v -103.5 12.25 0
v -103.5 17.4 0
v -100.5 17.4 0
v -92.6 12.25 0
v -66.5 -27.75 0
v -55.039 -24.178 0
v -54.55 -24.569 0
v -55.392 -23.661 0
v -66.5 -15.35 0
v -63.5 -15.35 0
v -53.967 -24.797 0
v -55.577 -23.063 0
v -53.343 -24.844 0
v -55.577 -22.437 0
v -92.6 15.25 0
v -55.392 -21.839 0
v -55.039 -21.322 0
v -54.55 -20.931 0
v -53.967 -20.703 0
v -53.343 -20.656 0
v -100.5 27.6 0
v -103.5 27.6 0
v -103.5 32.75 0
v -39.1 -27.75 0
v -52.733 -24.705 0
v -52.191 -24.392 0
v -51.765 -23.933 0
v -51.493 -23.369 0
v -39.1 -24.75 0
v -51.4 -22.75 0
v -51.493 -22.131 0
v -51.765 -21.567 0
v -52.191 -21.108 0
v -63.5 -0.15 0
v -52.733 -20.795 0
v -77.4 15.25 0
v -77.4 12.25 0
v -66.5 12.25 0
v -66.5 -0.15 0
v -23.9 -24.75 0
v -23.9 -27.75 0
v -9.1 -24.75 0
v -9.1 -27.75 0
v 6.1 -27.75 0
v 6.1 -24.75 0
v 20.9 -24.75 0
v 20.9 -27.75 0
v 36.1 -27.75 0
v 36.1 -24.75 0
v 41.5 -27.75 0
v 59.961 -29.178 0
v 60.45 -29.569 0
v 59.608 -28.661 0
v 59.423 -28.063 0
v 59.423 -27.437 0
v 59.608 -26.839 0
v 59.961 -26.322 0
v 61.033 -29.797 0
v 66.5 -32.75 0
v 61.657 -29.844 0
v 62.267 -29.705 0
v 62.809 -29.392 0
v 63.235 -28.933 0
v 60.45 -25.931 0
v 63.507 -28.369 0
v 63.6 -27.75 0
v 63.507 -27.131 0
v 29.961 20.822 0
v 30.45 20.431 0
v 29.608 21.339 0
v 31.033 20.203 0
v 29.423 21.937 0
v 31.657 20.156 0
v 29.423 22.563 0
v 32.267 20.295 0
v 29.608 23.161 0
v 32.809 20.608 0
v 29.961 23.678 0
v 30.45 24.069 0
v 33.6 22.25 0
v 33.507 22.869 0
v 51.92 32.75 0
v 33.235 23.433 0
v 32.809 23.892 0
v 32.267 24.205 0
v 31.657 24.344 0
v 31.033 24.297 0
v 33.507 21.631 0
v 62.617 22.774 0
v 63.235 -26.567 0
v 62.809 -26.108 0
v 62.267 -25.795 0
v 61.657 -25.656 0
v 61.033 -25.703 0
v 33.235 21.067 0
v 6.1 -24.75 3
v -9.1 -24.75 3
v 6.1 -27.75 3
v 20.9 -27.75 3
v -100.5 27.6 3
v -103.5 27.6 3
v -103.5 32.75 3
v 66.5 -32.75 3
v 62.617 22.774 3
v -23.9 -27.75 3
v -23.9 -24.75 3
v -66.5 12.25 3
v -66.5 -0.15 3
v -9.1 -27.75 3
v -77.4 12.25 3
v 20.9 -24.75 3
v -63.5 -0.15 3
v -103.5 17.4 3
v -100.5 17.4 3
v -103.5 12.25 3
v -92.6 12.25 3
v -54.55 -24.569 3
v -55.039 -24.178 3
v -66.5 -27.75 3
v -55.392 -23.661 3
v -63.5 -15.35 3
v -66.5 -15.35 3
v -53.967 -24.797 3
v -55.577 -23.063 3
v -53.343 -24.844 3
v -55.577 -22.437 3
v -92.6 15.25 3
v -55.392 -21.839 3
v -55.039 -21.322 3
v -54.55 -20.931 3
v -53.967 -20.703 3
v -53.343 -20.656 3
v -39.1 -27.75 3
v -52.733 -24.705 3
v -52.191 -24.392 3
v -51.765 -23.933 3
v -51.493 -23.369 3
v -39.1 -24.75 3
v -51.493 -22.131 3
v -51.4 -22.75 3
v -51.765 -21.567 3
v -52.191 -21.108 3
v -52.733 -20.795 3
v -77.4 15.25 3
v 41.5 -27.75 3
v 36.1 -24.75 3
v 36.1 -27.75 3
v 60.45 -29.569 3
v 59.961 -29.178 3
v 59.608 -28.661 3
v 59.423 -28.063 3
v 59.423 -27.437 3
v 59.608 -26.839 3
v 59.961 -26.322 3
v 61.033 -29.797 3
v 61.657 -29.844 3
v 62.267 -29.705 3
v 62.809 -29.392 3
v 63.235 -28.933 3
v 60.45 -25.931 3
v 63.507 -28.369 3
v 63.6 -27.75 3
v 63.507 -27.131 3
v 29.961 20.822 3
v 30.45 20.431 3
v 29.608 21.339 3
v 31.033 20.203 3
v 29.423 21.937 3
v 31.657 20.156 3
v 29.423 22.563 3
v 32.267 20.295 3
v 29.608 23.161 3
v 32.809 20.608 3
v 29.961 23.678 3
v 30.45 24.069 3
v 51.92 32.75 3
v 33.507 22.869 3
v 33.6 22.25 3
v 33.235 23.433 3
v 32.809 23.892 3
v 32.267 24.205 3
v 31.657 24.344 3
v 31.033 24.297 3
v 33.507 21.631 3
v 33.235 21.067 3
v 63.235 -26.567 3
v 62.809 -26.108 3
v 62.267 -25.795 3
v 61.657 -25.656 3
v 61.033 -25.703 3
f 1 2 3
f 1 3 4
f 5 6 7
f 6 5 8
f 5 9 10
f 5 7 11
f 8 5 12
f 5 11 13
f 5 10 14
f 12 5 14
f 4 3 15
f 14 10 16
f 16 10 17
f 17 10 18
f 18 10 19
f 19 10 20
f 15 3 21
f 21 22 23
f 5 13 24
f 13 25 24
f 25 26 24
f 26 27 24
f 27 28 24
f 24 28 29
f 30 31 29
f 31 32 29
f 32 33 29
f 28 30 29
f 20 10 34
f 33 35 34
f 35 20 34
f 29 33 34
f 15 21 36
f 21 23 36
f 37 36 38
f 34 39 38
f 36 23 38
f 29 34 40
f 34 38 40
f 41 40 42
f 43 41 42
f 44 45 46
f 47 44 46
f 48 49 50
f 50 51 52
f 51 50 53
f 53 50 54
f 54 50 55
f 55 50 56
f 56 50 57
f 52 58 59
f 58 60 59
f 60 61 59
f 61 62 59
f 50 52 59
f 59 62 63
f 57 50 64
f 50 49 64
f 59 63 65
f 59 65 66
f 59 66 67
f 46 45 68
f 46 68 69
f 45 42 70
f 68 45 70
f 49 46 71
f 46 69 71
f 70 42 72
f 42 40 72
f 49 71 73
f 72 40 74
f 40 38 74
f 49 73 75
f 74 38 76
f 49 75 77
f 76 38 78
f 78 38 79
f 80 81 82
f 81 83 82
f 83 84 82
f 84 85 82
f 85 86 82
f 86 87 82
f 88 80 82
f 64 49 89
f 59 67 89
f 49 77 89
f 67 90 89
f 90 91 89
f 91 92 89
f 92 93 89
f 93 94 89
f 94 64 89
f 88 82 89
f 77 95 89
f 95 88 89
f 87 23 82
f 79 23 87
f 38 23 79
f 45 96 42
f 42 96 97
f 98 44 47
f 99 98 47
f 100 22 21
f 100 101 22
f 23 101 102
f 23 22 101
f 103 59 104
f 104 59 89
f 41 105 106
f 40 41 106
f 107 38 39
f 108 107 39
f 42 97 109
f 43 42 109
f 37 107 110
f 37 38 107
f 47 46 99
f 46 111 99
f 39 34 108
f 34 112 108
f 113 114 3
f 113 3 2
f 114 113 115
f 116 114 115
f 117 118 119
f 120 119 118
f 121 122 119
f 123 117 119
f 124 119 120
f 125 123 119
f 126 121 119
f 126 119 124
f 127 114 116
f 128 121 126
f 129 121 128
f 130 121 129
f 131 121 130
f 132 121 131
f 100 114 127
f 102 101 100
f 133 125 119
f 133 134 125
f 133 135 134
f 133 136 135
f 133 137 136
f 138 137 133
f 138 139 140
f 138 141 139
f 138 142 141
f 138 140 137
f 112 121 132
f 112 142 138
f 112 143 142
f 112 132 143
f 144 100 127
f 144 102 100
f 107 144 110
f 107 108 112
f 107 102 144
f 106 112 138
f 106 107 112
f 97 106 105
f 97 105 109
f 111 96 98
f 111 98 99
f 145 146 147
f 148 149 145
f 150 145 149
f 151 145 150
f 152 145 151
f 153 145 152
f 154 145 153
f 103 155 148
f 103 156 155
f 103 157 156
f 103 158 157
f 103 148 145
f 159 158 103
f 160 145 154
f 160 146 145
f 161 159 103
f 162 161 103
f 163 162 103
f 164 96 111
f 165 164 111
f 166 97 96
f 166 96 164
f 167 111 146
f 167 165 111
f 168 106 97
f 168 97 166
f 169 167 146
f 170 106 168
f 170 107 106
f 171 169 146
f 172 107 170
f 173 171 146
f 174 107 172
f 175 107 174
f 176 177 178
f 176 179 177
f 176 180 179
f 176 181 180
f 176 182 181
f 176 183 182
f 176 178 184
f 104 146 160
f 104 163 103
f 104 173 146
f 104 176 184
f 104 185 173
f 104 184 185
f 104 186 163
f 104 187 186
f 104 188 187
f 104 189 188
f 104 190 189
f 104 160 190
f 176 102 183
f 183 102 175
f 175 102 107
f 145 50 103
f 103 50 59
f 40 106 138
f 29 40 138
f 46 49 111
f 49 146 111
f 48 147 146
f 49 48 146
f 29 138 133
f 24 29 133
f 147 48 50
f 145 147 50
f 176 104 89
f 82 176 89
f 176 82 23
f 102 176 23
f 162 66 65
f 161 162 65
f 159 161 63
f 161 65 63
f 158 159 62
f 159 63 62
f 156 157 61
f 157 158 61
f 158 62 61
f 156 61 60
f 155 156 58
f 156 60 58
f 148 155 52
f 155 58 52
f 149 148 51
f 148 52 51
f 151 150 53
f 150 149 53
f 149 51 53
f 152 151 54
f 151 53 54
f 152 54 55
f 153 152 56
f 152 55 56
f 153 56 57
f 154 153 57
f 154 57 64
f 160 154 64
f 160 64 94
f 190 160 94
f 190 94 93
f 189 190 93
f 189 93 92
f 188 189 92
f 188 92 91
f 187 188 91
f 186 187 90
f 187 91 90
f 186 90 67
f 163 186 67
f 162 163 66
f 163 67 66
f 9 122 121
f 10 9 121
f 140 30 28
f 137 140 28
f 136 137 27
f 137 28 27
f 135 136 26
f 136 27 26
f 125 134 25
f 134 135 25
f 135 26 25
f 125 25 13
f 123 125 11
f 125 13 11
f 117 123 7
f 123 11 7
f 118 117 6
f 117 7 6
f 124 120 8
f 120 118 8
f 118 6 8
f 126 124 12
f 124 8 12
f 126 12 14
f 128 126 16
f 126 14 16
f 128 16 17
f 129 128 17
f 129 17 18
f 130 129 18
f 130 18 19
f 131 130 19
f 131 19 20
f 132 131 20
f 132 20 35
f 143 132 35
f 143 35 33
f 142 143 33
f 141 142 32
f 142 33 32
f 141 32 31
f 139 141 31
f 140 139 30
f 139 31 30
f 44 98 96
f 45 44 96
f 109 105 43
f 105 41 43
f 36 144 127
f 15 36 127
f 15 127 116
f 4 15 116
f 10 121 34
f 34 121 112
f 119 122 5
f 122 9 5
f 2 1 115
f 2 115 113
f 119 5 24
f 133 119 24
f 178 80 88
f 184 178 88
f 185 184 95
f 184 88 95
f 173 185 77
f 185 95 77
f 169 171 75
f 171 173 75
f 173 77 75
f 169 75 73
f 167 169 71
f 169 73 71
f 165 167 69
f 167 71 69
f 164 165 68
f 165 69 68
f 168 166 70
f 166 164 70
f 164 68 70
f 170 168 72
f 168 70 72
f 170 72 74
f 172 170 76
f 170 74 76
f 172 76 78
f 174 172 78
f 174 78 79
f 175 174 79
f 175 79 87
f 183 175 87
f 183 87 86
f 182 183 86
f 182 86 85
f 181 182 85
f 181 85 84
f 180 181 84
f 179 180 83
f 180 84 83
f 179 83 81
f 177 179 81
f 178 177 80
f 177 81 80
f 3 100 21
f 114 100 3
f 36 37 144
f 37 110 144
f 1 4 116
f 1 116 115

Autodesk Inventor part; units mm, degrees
ref_plane "YZ Plane" through (0, 0, 0) normal (1, 0, 0) x (0, 1, 0)
ref_plane "XZ Plane" through (0, 0, 0) normal (0, 1, 0) x (-1, 0, 0)
ref_plane "XY Plane" through (0, 0, 0) normal (0, 0, 1) x (1, 0, 0)
sketch "Sketch1" plane through (0, 0, 0) normal (0, 0, 1) x (1, 0, 0)
  line L0 (-66.5, -32.75) -> (66.5, -32.75)
  line L1 (66.5, -32.75) -> (66.5, 32.75)
  line L2 (66.5, 32.75) -> (-66.5, 32.75)
  line L3 (-66.5, 32.75) -> (-66.5, -32.75)
  line L4 (-66.5, -32.75) -> (66.5, 32.75) construction
  line L5 (66.5, -32.75) -> (-66.5, 32.75) construction
  line L6 (-103.5, 32.75) -> (-66.5, 32.75)
  line L7 (-66.5, 32.75) -> (-66.5, 12.25)
  line L8 (-66.5, 12.25) -> (-103.5, 12.25)
  line L9 (-103.5, 12.25) -> (-103.5, 32.75)
  line L10 (-103.5, 32.75) -> (-66.5, 12.25) construction
  line L11 (-66.5, 32.75) -> (-103.5, 12.25) construction
  line L12 (66.5, -32.75) -> (61.9198, 32.75)
  circle A0 centre (-53.5, -22.75) radius 2.1
  circle A1 centre (31.5, 22.25) radius 2.1
  line L13 (-66.5, -27.75) -> (41.5, -27.75)
  line L14 (41.5, -27.75) -> (66.5, -32.75)
  circle A2 centre (61.5, -27.75) radius 2.1
  point P0 (0, 0)
  point P1 (-85, 22.5)
  dimension "d0" = 65.5
  dimension "d1" = 133
  dimension "d3" = 37
  dimension "d4" = 4.2
  dimension "d5" = 13
  dimension "d7" = 98
  dimension "d8" = 108
  dimension "d9" = 5
  dimension "d10" = 5
  dimension "d11" = 50
  dimension "d12" = 4.2
  dimension "d13" = 4.2
  dimension "d15" = 5
  dimension "d16" = 4
  dimension "d36" = 40
extrude "Extrusion1" add sketch "Sketch1" along normal blind 3 contours L14 L13 L3 L2 L12 | L8 L9 L6 L3
sketch "Sketch2" plane through (0, 0, 3) normal (0, 0, 1) x (1, 0, 0)
  line L0 (66.5, -32.75) -> (61.9198, 32.75) construction
  line L1 (61.9198, 32.75) -> (-103.5, 32.75) construction
  line L2 (-103.5, 32.75) -> (-103.5, 12.25) construction
  line L3 (-103.5, 12.25) -> (-66.5, 12.25) construction
  line L4 (-66.5, 12.25) -> (-66.5, -27.75) construction
  line L5 (-66.5, -27.75) -> (41.5, -27.75) construction
  line L6 (41.5, -27.75) -> (66.5, -32.75) construction
  circle A0 centre (-53.5, -22.75) radius 2.1 construction
  circle A1 centre (31.5, 22.25) radius 2.1 construction
  circle A2 centre (61.5, -27.75) radius 2.1 construction
  line L7 (-103.5, 27.6) -> (-100.5, 27.6)
  line L8 (-100.5, 27.6) -> (-100.5, 17.4)
  line L9 (-100.5, 17.4) -> (-103.5, 17.4)
  line L10 (-103.5, 17.4) -> (-103.5, 27.6)
  line L11 (-103.5, 27.6) -> (-100.5, 17.4) construction
  line L12 (-100.5, 27.6) -> (-103.5, 17.4) construction
  line L13 (-92.6, 12.25) -> (-77.4, 12.25)
  line L14 (-77.4, 12.25) -> (-77.4, 15.25)
  line L15 (-77.4, 15.25) -> (-92.6, 15.25)
  line L16 (-92.6, 15.25) -> (-92.6, 12.25)
  line L17 (-92.6, 12.25) -> (-77.4, 15.25) construction
  line L18 (-77.4, 12.25) -> (-92.6, 15.25) construction
  line L19 (-103.5, 12.25) -> (-66.5, 12.25) projected
  line L20 (-66.5, -15.35) -> (-63.5, -15.35)
  line L21 (-63.5, -15.35) -> (-63.5, -0.15)
  line L22 (-63.5, -0.15) -> (-66.5, -0.15)
  line L23 (-66.5, -0.15) -> (-66.5, -15.35)
  line L24 (-66.5, -15.35) -> (-63.5, -0.15) construction
  line L25 (-63.5, -15.35) -> (-66.5, -0.15) construction
  line L26 (-66.5, 12.25) -> (-66.5, -27.75) projected
  line L27 (-39.1, -27.75) -> (-23.9, -27.75)
  line L28 (-23.9, -27.75) -> (-23.9, -24.75)
  line L29 (-23.9, -24.75) -> (-39.1, -24.75)
  line L30 (-39.1, -24.75) -> (-39.1, -27.75)
  line L31 (-39.1, -27.75) -> (-23.9, -24.75) construction
  line L32 (-23.9, -27.75) -> (-39.1, -24.75) construction
  line L33 (-66.5, -27.75) -> (41.5, -27.75) projected
  line L34 (-9.1, -27.75) -> (6.1, -27.75)
  line L35 (6.1, -27.75) -> (6.1, -24.75)
  line L36 (6.1, -24.75) -> (-9.1, -24.75)
  line L37 (-9.1, -24.75) -> (-9.1, -27.75)
  line L38 (-9.1, -27.75) -> (6.1, -24.75) construction
  line L39 (6.1, -27.75) -> (-9.1, -24.75) construction
  line L40 (20.9, -27.75) -> (36.1, -27.75)
  line L41 (36.1, -27.75) -> (36.1, -24.75)
  line L42 (36.1, -24.75) -> (20.9, -24.75)
  line L43 (20.9, -24.75) -> (20.9, -27.75)
  line L44 (20.9, -27.75) -> (36.1, -24.75) construction
  line L45 (36.1, -27.75) -> (20.9, -24.75) construction
  point P0 (0, 0)
  point P1 (-102, 22.5)
  point P2 (-103.5, 22.5)
  point P3 (-85, 13.75)
  point P4 (-85, 12.25)
  point P5 (-65, -7.75)
  point P6 (-66.5, -7.75)
  point P7 (-31.5, -26.25)
  point P8 (-1.5, -26.25)
  point P9 (28.5, -26.25)
  point P10 (20.9, -27.75)
  point P11 (36.1, -27.75)
  point P12 (-9.1, -27.75)
  point P13 (6.1, -27.75)
  dimension "d19" = 3
  dimension "d20" = 10.2
  dimension "d21" = 3
  dimension "d22" = 15.2
  dimension "d23" = 3
  dimension "d24" = 15.2
  dimension "d25" = 3
  dimension "d26" = 15.2
  dimension "d27" = 3
  dimension "d28" = 15.2
  dimension "d30" = 35
  dimension "d31" = 3
  dimension "d33" = 15.2
  dimension "d37" = 30
  dimension "d38" = 30
extrude "Extrusion2" cut sketch "Sketch2" against normal through all
chamfer "Chamfer1" distance 10 angle 45 1 edges at (61.9198, 32.75, 1.5)
equation "\"d12\" = d4"
equation "\"d13\" = d12"
equation "\"d21\" = d19"
equation "\"d23\" = d21"
equation "\"d25\" = d23"
equation "\"d27\" = d25"
equation "\"d28\" = d26"
equation "\"d31\" = d27"
equation "\"d33\" = d28"
equation "\"d38\" = d37"
properties part number "bed_acrylic_side"
